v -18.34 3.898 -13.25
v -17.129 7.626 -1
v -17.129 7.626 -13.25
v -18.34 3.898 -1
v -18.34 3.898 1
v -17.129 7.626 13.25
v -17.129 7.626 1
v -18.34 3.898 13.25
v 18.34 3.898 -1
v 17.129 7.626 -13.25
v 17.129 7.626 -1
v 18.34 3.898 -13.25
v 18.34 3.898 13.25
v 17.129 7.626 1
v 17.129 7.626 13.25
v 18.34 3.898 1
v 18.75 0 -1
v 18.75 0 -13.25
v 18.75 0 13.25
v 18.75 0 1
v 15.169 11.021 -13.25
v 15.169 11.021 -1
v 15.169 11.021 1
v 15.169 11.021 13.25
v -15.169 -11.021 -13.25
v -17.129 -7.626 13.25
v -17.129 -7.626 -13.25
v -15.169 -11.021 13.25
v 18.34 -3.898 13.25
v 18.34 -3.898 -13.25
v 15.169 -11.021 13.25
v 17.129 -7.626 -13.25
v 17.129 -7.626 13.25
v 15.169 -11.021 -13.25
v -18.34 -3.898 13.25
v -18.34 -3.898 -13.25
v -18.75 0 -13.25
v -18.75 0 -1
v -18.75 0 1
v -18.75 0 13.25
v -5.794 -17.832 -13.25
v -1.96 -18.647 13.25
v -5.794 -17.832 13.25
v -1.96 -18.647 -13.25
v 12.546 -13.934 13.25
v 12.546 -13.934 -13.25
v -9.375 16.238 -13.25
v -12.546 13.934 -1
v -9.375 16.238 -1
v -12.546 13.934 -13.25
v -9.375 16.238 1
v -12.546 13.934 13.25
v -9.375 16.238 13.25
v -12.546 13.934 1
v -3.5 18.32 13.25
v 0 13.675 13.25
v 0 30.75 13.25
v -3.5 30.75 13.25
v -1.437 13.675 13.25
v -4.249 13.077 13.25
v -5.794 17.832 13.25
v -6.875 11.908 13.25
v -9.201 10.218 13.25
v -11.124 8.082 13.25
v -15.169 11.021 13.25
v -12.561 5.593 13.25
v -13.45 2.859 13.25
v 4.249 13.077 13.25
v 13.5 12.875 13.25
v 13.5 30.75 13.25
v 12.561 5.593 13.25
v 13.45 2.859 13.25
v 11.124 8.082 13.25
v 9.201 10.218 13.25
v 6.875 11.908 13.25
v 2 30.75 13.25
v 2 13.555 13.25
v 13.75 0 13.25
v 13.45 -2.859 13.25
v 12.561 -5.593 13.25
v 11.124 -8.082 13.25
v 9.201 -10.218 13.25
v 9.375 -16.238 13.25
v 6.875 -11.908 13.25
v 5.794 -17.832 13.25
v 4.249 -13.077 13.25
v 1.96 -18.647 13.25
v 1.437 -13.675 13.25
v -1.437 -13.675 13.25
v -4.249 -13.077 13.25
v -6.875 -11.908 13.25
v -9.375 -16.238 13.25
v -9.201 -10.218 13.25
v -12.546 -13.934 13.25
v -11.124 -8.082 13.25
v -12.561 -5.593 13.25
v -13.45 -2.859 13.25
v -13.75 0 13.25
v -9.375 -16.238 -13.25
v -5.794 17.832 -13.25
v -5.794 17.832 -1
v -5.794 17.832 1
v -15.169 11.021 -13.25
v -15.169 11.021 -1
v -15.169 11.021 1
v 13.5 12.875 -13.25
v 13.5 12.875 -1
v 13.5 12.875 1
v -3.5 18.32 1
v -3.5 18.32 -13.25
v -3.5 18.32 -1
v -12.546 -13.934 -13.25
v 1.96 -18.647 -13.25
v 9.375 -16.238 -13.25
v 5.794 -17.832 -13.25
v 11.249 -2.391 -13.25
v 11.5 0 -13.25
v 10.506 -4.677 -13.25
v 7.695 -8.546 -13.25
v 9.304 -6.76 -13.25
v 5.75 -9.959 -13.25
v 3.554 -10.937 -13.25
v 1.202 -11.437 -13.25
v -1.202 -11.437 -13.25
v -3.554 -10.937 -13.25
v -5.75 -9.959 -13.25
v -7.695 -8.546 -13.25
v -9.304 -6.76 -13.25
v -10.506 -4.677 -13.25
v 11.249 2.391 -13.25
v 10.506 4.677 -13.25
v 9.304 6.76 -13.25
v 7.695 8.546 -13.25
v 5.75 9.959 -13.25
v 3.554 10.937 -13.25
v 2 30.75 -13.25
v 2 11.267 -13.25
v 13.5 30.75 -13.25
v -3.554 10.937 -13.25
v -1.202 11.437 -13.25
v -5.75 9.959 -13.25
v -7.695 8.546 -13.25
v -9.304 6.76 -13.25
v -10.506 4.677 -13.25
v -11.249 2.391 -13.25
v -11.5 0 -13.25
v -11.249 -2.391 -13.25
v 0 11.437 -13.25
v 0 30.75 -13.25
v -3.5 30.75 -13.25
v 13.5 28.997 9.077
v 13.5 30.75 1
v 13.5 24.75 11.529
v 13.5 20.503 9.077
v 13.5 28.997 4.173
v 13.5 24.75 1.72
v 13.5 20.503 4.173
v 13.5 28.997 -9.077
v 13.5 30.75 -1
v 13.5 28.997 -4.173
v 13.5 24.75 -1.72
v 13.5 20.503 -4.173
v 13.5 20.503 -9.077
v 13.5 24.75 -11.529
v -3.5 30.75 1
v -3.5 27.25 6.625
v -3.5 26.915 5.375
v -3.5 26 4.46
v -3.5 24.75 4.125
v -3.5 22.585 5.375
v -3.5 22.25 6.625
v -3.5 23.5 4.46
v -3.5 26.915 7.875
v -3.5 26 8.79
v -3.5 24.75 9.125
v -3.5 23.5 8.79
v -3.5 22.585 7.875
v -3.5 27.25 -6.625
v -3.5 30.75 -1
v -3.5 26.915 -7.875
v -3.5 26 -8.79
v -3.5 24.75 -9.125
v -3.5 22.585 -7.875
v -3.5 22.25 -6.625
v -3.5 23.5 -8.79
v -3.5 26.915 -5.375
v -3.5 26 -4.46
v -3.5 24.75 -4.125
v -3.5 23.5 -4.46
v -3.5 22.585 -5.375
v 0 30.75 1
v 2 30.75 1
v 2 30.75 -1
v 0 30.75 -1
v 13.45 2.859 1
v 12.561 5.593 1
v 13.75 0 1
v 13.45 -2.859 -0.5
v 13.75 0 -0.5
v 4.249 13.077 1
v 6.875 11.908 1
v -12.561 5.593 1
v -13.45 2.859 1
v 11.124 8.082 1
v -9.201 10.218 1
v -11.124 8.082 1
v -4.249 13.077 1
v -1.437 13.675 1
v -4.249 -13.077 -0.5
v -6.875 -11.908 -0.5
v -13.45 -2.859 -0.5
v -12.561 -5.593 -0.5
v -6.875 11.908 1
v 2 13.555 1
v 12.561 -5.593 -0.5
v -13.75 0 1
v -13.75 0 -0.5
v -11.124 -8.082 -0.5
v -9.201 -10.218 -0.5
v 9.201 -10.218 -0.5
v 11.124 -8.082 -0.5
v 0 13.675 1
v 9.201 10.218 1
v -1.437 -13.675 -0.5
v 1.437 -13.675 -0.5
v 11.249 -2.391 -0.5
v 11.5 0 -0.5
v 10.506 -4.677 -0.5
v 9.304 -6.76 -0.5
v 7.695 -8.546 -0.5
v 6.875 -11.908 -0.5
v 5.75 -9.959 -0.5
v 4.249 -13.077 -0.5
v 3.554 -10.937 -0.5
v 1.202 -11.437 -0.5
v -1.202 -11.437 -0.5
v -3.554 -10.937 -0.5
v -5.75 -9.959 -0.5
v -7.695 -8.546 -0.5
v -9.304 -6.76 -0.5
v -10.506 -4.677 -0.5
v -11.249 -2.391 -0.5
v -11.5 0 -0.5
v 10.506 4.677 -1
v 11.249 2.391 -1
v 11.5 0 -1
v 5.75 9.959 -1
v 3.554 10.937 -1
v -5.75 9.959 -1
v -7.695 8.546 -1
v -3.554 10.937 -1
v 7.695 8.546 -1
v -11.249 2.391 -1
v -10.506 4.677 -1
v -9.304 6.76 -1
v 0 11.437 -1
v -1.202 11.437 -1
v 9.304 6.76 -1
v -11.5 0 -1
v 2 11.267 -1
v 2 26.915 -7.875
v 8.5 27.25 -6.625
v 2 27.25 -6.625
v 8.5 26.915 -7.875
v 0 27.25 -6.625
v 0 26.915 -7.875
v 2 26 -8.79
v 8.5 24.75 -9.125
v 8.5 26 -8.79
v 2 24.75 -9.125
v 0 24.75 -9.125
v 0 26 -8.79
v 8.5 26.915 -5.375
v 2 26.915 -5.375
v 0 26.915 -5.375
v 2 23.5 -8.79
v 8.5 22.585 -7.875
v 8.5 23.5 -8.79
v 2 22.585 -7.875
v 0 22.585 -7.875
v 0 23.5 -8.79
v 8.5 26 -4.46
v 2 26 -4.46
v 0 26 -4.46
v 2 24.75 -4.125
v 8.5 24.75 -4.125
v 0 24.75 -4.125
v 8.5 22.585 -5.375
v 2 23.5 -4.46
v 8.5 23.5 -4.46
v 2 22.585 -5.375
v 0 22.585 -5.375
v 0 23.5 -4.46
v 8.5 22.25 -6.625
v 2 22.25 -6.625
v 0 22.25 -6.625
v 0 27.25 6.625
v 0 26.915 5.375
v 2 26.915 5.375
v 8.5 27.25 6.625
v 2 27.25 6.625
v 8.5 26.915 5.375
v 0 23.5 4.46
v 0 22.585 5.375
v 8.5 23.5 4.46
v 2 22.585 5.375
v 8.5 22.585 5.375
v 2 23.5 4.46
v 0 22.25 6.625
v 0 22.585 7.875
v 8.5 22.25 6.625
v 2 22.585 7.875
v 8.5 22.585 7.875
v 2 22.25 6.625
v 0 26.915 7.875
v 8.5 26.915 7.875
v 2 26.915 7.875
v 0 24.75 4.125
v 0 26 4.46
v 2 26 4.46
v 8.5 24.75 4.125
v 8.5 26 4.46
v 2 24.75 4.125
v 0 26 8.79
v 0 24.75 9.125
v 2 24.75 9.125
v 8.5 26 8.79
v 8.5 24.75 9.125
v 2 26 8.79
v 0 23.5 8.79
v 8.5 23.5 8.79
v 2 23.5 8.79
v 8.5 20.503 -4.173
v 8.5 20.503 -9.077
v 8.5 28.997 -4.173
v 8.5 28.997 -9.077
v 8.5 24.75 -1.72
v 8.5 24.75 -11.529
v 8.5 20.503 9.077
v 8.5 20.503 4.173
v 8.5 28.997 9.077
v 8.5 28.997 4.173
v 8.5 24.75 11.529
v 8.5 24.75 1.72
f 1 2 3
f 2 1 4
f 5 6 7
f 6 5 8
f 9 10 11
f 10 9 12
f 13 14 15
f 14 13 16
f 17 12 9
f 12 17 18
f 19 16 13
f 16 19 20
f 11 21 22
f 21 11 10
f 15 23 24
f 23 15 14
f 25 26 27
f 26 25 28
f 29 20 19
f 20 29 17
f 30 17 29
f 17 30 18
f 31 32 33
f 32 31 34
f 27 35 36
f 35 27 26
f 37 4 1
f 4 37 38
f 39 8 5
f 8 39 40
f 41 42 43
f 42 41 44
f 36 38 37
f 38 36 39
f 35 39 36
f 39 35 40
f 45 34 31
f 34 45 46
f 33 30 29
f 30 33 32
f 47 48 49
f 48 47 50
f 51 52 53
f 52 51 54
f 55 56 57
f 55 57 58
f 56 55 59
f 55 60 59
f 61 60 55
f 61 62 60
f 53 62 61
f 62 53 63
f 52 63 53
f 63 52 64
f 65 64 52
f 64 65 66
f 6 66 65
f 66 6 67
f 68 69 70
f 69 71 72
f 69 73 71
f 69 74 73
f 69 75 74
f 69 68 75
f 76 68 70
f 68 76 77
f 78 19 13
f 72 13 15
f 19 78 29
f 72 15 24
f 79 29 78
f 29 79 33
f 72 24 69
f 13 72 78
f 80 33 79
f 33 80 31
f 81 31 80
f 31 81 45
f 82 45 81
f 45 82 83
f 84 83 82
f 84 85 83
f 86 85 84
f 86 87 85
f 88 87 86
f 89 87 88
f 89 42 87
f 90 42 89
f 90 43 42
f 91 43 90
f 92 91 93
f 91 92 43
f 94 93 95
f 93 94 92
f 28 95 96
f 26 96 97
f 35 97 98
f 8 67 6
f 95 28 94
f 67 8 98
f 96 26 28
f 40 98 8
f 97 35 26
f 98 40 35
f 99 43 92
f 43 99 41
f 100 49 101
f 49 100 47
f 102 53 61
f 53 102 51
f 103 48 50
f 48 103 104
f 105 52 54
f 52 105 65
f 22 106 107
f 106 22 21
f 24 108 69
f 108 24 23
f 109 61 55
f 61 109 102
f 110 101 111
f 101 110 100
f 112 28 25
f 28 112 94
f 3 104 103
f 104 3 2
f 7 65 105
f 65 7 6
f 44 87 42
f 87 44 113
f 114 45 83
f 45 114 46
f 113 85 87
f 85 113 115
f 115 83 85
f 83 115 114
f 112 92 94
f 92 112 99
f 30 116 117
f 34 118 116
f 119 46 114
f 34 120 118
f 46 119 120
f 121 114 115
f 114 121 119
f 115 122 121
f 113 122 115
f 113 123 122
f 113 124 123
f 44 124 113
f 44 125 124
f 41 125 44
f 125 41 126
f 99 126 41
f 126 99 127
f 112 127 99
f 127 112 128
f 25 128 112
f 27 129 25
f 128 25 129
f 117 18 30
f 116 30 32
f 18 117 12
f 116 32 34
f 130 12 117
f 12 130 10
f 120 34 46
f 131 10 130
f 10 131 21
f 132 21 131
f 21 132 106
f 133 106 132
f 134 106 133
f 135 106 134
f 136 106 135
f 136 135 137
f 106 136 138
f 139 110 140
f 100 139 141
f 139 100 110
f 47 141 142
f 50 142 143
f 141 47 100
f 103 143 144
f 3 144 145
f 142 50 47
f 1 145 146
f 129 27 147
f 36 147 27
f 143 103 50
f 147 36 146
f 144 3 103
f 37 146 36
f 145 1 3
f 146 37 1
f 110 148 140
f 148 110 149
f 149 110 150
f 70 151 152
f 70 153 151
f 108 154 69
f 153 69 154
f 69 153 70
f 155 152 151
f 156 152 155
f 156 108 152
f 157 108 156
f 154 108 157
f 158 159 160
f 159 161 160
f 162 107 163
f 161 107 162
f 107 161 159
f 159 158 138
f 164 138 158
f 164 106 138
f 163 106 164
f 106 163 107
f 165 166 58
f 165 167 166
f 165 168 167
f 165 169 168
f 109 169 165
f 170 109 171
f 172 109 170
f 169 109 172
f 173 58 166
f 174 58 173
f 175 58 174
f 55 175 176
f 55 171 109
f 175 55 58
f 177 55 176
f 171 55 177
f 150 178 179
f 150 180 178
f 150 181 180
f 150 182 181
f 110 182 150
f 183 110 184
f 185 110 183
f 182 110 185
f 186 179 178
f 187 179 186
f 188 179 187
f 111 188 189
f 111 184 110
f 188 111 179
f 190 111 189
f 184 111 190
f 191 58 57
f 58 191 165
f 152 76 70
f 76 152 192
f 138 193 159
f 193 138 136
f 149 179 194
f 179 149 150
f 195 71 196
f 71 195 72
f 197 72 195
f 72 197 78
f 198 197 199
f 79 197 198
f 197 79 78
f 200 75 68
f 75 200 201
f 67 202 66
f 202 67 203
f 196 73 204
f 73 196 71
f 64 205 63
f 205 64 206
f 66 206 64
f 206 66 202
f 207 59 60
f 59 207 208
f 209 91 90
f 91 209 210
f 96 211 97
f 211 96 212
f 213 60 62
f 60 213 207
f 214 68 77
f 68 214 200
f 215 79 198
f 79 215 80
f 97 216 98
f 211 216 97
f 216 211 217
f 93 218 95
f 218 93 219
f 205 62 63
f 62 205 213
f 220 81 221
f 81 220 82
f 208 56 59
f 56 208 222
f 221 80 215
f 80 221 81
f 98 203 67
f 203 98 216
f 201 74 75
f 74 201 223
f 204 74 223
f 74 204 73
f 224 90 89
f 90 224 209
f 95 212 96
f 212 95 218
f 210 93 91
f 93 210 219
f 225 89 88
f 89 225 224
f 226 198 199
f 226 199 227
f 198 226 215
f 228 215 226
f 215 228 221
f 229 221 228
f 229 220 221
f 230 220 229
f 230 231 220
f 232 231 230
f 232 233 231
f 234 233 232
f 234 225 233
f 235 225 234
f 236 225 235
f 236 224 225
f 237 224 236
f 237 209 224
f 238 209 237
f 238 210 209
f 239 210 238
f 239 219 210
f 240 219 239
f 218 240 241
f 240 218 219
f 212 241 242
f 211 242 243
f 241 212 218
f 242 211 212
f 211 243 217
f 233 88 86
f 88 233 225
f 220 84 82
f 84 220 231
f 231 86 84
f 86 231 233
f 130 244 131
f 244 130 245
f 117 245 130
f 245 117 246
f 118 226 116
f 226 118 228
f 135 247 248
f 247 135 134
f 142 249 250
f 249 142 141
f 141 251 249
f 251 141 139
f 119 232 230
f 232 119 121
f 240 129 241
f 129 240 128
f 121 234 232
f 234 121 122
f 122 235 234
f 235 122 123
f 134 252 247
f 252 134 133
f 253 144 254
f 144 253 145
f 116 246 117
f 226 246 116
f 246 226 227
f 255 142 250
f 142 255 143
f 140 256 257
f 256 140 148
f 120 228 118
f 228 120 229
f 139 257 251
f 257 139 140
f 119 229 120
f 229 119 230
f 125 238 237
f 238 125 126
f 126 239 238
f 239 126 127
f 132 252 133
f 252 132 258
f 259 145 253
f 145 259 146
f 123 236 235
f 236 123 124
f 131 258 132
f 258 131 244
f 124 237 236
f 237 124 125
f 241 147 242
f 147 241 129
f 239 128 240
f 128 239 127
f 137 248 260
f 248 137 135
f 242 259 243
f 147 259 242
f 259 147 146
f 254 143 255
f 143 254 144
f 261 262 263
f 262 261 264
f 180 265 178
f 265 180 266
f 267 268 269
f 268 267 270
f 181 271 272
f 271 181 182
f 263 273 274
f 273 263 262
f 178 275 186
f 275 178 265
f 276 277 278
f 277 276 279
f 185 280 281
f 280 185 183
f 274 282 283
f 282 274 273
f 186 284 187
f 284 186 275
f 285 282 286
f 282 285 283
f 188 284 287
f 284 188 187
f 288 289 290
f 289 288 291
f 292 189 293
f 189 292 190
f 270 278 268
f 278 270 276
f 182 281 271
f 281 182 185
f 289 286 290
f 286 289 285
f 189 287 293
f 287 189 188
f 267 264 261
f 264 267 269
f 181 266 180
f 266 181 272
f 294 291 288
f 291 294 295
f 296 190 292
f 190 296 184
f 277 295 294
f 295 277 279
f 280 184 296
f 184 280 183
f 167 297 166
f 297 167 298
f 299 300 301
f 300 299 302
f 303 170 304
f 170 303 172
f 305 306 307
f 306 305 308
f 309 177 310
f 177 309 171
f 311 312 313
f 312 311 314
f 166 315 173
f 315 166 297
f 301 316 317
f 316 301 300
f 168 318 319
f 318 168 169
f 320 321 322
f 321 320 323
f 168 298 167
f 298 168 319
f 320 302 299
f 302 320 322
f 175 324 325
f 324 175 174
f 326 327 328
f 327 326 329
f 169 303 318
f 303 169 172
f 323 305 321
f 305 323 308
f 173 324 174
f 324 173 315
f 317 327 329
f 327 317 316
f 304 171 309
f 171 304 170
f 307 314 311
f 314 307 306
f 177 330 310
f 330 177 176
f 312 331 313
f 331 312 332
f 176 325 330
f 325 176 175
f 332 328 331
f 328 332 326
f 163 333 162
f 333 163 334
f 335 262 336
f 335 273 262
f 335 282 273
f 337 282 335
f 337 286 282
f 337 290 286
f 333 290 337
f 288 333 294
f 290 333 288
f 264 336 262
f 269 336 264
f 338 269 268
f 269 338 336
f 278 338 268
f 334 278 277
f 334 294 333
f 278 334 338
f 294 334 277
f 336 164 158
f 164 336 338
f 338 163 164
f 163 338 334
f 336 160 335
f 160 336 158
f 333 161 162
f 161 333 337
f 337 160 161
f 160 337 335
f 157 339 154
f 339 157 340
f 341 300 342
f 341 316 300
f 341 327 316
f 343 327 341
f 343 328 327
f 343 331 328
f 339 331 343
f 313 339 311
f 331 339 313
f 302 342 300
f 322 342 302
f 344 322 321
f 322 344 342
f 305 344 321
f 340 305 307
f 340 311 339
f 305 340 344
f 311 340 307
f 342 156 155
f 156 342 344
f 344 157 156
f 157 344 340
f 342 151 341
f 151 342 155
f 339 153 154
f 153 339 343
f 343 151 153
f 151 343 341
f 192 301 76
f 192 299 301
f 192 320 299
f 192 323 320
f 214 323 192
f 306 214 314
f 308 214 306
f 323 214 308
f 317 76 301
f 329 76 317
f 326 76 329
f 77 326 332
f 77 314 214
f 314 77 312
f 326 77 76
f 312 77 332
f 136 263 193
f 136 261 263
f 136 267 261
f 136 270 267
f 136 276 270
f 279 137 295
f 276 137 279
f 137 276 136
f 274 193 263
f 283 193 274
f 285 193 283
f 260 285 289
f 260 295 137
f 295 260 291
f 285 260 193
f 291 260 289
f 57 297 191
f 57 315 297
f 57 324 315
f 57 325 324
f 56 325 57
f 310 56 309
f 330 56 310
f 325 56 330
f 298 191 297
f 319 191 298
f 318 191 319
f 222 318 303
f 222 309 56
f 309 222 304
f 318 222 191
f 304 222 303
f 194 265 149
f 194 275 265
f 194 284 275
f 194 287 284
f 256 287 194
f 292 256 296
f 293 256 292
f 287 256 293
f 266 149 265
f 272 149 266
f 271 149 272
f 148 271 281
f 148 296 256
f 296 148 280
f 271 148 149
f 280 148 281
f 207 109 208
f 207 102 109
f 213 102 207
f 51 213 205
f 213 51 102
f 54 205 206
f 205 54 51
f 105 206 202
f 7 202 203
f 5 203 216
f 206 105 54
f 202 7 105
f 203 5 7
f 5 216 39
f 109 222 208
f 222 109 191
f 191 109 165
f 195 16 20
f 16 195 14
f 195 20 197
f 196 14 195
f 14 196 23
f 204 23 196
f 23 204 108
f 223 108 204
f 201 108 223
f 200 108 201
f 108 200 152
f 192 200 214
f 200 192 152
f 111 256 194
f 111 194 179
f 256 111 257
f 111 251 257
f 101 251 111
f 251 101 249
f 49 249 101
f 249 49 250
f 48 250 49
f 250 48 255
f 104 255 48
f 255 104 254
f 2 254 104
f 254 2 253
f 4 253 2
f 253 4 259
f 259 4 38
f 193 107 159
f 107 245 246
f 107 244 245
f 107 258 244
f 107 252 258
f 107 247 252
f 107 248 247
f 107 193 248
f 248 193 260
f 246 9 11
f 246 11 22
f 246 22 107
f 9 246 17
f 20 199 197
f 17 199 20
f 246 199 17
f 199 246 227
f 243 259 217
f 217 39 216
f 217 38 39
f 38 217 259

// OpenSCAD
/*
Tripod leg clamp replacement
Jan 25, 2015
Corky Mork
*/
//Duiameter of larger leg (mm)
diameter1=27.5;//
//Duiameter of smaller leg (mm)
diameter2=23;//
//Diameter of screw holes (mm)
hole=5;//
//Size of nut or hex head (mm)
nut=8.5;//
/* [Hidden] */
height=26.5;
thick=5;
gap=2;
tab=12;


module tripodclamp()
{
	difference() {
		union() {			
//body
			cylinder(h = height, r = diameter1/2+thick, center = true);
//tab
		translate ([thick,diameter1/2+tab/2,0])
				 cube([thick*3+gap, tab+2*thick, height], center = true);
		}

		union() {
			translate ([0,0,height/4])
				cylinder(h = height/2+1, r = diameter1/2, center = true);
			cylinder(h = height+1, r = diameter2/2, center = true);
//screw holes
			rotate([0,90,0])
			translate([height/4,diameter1/2+tab/2+thick,gap])
				cylinder(h = thick*5, r = hole/2, center = true,$fn=12);
			rotate([0,90,0])
			translate([-height/4,diameter1/2+tab/2+thick,gap])
				cylinder(h = thick*5, r = hole/2, center = true,$fn=12);
//nut traps
			rotate([0,90,0])
			translate([height/4,diameter1/2+tab/2+thick,2*thick+gap])
				cylinder(h = thick+gap, r = nut*.577, center = true,$fn=6);
			rotate([0,90,0])
			translate([-height/4,diameter1/2+tab/2+thick,2*thick+gap])
				cylinder(h = thick+gap, r = nut*.577, center = true,$fn=6);
//slots
			translate ([gap/2,diameter1/2+1.5*thick,0])
				 cube([gap, diameter1/2+tab+thick, height+1], center = true);
			translate ([0,diameter1/4+thick/2+tab/2,0])
				 cube([diameter1+2*thick+1, diameter1/2+tab+thick, gap], center = true);
		}
	}
}

tripodclamp();
